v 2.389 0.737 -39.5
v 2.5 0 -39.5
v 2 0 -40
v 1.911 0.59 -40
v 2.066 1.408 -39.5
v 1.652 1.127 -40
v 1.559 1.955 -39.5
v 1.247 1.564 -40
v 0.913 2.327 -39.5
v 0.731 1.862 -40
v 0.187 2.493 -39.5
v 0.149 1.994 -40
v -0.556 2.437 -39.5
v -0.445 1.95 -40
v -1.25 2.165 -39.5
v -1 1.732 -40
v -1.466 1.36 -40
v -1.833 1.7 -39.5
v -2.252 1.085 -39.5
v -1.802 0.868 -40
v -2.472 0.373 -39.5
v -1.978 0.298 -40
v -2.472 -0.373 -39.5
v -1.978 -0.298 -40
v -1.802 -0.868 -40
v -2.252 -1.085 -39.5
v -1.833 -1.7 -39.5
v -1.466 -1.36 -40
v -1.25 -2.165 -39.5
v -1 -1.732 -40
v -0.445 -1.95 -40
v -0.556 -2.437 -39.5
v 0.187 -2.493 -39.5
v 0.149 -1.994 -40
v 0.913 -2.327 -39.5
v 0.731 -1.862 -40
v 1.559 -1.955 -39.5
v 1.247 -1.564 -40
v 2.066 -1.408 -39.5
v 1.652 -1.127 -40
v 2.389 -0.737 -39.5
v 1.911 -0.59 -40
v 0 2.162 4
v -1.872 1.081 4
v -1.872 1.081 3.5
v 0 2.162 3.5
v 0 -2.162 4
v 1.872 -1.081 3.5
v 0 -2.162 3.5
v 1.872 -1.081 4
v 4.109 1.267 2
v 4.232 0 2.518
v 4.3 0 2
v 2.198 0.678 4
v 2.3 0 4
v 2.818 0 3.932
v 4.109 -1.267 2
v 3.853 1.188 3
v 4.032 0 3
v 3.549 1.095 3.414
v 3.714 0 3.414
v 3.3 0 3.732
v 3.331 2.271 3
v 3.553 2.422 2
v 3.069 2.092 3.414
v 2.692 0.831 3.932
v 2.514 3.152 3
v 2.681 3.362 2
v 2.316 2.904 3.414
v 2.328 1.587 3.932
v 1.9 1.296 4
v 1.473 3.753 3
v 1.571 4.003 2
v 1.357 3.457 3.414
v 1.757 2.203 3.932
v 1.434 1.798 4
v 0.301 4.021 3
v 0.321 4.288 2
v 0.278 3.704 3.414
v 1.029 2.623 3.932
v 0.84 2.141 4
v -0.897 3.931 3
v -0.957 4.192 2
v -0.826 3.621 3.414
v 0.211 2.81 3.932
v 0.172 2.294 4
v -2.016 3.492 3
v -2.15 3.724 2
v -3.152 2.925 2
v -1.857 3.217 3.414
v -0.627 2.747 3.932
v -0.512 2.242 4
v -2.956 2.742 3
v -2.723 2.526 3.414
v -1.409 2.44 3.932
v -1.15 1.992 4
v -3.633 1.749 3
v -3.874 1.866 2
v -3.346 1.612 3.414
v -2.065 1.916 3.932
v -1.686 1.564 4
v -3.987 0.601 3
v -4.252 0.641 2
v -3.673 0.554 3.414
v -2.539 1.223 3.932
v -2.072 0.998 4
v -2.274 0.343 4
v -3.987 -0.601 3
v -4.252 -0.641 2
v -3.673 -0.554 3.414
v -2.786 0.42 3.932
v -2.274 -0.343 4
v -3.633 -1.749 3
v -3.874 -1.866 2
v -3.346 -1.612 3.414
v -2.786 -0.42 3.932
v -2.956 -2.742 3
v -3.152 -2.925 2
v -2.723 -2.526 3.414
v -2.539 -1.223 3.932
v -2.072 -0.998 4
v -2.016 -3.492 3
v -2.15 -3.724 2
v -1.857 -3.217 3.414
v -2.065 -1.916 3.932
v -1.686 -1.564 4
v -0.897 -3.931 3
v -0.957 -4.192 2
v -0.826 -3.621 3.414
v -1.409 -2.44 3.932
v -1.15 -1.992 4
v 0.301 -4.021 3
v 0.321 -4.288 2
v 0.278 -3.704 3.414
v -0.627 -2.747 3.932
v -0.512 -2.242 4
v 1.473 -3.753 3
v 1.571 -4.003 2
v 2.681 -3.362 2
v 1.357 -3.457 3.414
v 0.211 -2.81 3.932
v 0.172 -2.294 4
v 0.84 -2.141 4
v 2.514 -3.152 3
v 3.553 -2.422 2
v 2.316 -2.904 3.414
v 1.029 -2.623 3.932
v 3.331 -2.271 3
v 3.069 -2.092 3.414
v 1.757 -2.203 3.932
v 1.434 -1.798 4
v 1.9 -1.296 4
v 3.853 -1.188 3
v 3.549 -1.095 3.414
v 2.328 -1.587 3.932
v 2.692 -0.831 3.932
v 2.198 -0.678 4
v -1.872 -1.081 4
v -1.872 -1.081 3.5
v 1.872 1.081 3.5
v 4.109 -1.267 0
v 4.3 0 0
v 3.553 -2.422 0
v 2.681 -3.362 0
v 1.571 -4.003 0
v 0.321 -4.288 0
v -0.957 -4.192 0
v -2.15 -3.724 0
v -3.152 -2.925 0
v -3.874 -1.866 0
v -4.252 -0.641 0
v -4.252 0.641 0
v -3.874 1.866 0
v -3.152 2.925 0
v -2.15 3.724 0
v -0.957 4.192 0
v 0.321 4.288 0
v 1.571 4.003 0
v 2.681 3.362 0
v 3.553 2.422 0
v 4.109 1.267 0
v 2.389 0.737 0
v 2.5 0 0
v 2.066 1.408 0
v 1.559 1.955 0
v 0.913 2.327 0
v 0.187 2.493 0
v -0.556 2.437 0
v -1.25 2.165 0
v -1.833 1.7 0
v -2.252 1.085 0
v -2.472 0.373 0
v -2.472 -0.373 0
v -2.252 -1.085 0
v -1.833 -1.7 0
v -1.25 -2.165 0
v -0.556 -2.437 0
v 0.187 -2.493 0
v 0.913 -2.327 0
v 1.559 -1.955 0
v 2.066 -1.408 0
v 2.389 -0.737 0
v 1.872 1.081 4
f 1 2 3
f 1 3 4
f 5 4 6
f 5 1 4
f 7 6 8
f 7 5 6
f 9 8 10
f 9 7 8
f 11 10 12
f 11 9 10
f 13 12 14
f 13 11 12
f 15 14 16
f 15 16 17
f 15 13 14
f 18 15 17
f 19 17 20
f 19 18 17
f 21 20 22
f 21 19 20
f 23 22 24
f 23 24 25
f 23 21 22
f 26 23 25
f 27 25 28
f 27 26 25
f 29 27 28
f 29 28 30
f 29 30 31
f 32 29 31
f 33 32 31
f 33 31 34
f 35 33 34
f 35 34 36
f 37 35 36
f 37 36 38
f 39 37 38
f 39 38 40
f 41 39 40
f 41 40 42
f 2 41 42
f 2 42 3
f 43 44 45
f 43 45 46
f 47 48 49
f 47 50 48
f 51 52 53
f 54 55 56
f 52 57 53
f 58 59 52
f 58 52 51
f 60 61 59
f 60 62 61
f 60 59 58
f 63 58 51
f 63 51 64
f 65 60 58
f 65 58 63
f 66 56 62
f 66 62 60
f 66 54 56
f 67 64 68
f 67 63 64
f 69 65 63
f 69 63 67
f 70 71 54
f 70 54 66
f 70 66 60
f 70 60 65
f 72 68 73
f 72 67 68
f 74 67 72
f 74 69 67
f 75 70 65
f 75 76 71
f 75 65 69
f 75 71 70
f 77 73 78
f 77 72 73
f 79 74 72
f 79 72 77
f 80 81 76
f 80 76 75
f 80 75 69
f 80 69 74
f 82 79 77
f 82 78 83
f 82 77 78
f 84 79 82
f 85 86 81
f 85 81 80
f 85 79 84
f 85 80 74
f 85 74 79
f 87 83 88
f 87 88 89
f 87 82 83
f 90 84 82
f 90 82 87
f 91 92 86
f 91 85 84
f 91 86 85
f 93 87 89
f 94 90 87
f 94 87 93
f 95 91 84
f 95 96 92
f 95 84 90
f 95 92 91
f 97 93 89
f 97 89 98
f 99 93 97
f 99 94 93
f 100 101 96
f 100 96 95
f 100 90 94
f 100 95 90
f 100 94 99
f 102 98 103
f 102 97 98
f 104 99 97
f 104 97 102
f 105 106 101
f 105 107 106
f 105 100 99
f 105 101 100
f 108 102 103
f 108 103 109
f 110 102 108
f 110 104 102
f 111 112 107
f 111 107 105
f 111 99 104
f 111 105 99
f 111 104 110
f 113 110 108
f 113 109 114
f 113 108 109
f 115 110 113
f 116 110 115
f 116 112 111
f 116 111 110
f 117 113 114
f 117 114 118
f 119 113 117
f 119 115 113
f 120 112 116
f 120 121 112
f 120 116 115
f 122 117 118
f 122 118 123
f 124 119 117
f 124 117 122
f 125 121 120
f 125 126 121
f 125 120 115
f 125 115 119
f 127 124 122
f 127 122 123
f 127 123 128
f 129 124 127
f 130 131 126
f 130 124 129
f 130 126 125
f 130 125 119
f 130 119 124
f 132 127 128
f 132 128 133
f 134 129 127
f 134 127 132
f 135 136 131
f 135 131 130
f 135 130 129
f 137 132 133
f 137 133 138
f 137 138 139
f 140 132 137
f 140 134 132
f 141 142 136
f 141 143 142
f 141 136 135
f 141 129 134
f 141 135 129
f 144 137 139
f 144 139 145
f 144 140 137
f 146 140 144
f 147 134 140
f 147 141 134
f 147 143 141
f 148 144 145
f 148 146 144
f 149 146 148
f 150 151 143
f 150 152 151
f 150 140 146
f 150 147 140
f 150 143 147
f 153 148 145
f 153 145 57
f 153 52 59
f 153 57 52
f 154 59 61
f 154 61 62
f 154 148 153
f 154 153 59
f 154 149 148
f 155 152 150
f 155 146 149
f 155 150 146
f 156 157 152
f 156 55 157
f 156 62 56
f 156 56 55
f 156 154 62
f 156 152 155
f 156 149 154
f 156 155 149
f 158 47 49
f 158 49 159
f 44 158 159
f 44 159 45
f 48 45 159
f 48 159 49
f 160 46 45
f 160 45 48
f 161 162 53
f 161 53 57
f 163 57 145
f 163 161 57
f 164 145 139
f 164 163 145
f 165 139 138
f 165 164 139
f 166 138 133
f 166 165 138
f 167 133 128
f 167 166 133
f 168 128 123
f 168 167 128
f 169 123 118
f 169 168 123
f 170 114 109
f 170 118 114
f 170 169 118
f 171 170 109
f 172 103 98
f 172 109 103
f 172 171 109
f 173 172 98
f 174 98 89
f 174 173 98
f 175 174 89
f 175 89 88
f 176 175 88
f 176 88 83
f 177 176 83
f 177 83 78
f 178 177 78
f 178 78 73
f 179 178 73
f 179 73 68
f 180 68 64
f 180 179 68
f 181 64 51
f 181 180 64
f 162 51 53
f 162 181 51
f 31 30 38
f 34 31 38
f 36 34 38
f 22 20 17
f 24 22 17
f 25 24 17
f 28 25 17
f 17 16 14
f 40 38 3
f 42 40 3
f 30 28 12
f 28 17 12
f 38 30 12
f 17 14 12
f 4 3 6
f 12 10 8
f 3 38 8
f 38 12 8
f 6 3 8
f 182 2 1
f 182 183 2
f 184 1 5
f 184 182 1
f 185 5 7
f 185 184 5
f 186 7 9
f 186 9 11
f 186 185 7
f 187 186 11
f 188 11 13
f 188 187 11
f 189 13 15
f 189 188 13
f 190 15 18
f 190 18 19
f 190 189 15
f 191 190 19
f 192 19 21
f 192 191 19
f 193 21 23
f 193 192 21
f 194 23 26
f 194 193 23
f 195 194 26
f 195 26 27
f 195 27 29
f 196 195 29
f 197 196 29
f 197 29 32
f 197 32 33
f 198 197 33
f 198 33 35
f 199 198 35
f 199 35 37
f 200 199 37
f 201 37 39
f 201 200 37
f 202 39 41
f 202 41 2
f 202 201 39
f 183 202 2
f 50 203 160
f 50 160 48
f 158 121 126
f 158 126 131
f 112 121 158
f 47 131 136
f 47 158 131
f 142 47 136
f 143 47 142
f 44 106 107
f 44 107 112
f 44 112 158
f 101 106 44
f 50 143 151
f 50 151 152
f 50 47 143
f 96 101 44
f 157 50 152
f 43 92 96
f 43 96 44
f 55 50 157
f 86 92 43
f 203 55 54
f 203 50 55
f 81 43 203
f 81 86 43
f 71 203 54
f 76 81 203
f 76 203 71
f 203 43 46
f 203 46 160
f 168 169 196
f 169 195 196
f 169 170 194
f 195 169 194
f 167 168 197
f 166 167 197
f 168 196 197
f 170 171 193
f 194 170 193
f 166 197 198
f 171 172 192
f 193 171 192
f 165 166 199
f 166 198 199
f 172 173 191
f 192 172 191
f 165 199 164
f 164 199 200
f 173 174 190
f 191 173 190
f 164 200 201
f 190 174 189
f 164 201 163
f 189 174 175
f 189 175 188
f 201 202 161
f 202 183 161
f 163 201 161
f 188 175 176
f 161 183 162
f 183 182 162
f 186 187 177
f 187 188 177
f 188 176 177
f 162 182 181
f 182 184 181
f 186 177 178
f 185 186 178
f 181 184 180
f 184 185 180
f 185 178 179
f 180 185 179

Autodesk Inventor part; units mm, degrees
ref_plane "YZ Plane" through (0, 0, 0) normal (1, 0, 0) x (0, 1, 0)
ref_plane "XZ Plane" through (0, 0, 0) normal (0, 1, 0) x (-1, 0, 0)
ref_plane "XY Plane" through (0, 0, 0) normal (0, 0, 1) x (1, 0, 0)
sketch "Sketch1" plane through (0, 0, 0) normal (0, 0, 1) x (1, 0, 0)
  circle A0 centre (0, 0) radius 2.5
  dimension "d0" = 5
extrude "Extrusion1" add sketch "Sketch1" against normal blind 40
sketch "Sketch2" plane through (0, 0, 0) normal (0, 0, 1) x (1, 0, 0)
  circle A0 centre (0, 0) radius 4.3
  dimension "d3" = 8.6
extrude "Extrusion2" add sketch "Sketch2" along normal blind 4
fillet "Fillet1" radius 2 1 edges at (-4.3, 0, 4)
sketch "Sketch3" plane through (0, 0, 4) normal (0, 0, 1) x (1, 0, 0)
  line L0 (0, -2.162) -> (-1.8723, -1.081)
  line L1 (-1.8723, -1.081) -> (-1.8723, 1.081)
  line L2 (-1.8723, 1.081) -> (0, 2.162)
  line L3 (0, 2.162) -> (1.8723, 1.081)
  line L4 (1.8723, 1.081) -> (1.8723, -1.081)
  line L5 (1.8723, -1.081) -> (0, -2.162)
  point P0 (0, 0)
  point P1 (0, 0)
extrude "Extrusion3" cut sketch "Sketch3" against normal blind 0.5
chamfer "Chamfer1" distance 0.5 angle 45 1 edges at (-2.5, 0, -40)
properties part number "bolt m5"
